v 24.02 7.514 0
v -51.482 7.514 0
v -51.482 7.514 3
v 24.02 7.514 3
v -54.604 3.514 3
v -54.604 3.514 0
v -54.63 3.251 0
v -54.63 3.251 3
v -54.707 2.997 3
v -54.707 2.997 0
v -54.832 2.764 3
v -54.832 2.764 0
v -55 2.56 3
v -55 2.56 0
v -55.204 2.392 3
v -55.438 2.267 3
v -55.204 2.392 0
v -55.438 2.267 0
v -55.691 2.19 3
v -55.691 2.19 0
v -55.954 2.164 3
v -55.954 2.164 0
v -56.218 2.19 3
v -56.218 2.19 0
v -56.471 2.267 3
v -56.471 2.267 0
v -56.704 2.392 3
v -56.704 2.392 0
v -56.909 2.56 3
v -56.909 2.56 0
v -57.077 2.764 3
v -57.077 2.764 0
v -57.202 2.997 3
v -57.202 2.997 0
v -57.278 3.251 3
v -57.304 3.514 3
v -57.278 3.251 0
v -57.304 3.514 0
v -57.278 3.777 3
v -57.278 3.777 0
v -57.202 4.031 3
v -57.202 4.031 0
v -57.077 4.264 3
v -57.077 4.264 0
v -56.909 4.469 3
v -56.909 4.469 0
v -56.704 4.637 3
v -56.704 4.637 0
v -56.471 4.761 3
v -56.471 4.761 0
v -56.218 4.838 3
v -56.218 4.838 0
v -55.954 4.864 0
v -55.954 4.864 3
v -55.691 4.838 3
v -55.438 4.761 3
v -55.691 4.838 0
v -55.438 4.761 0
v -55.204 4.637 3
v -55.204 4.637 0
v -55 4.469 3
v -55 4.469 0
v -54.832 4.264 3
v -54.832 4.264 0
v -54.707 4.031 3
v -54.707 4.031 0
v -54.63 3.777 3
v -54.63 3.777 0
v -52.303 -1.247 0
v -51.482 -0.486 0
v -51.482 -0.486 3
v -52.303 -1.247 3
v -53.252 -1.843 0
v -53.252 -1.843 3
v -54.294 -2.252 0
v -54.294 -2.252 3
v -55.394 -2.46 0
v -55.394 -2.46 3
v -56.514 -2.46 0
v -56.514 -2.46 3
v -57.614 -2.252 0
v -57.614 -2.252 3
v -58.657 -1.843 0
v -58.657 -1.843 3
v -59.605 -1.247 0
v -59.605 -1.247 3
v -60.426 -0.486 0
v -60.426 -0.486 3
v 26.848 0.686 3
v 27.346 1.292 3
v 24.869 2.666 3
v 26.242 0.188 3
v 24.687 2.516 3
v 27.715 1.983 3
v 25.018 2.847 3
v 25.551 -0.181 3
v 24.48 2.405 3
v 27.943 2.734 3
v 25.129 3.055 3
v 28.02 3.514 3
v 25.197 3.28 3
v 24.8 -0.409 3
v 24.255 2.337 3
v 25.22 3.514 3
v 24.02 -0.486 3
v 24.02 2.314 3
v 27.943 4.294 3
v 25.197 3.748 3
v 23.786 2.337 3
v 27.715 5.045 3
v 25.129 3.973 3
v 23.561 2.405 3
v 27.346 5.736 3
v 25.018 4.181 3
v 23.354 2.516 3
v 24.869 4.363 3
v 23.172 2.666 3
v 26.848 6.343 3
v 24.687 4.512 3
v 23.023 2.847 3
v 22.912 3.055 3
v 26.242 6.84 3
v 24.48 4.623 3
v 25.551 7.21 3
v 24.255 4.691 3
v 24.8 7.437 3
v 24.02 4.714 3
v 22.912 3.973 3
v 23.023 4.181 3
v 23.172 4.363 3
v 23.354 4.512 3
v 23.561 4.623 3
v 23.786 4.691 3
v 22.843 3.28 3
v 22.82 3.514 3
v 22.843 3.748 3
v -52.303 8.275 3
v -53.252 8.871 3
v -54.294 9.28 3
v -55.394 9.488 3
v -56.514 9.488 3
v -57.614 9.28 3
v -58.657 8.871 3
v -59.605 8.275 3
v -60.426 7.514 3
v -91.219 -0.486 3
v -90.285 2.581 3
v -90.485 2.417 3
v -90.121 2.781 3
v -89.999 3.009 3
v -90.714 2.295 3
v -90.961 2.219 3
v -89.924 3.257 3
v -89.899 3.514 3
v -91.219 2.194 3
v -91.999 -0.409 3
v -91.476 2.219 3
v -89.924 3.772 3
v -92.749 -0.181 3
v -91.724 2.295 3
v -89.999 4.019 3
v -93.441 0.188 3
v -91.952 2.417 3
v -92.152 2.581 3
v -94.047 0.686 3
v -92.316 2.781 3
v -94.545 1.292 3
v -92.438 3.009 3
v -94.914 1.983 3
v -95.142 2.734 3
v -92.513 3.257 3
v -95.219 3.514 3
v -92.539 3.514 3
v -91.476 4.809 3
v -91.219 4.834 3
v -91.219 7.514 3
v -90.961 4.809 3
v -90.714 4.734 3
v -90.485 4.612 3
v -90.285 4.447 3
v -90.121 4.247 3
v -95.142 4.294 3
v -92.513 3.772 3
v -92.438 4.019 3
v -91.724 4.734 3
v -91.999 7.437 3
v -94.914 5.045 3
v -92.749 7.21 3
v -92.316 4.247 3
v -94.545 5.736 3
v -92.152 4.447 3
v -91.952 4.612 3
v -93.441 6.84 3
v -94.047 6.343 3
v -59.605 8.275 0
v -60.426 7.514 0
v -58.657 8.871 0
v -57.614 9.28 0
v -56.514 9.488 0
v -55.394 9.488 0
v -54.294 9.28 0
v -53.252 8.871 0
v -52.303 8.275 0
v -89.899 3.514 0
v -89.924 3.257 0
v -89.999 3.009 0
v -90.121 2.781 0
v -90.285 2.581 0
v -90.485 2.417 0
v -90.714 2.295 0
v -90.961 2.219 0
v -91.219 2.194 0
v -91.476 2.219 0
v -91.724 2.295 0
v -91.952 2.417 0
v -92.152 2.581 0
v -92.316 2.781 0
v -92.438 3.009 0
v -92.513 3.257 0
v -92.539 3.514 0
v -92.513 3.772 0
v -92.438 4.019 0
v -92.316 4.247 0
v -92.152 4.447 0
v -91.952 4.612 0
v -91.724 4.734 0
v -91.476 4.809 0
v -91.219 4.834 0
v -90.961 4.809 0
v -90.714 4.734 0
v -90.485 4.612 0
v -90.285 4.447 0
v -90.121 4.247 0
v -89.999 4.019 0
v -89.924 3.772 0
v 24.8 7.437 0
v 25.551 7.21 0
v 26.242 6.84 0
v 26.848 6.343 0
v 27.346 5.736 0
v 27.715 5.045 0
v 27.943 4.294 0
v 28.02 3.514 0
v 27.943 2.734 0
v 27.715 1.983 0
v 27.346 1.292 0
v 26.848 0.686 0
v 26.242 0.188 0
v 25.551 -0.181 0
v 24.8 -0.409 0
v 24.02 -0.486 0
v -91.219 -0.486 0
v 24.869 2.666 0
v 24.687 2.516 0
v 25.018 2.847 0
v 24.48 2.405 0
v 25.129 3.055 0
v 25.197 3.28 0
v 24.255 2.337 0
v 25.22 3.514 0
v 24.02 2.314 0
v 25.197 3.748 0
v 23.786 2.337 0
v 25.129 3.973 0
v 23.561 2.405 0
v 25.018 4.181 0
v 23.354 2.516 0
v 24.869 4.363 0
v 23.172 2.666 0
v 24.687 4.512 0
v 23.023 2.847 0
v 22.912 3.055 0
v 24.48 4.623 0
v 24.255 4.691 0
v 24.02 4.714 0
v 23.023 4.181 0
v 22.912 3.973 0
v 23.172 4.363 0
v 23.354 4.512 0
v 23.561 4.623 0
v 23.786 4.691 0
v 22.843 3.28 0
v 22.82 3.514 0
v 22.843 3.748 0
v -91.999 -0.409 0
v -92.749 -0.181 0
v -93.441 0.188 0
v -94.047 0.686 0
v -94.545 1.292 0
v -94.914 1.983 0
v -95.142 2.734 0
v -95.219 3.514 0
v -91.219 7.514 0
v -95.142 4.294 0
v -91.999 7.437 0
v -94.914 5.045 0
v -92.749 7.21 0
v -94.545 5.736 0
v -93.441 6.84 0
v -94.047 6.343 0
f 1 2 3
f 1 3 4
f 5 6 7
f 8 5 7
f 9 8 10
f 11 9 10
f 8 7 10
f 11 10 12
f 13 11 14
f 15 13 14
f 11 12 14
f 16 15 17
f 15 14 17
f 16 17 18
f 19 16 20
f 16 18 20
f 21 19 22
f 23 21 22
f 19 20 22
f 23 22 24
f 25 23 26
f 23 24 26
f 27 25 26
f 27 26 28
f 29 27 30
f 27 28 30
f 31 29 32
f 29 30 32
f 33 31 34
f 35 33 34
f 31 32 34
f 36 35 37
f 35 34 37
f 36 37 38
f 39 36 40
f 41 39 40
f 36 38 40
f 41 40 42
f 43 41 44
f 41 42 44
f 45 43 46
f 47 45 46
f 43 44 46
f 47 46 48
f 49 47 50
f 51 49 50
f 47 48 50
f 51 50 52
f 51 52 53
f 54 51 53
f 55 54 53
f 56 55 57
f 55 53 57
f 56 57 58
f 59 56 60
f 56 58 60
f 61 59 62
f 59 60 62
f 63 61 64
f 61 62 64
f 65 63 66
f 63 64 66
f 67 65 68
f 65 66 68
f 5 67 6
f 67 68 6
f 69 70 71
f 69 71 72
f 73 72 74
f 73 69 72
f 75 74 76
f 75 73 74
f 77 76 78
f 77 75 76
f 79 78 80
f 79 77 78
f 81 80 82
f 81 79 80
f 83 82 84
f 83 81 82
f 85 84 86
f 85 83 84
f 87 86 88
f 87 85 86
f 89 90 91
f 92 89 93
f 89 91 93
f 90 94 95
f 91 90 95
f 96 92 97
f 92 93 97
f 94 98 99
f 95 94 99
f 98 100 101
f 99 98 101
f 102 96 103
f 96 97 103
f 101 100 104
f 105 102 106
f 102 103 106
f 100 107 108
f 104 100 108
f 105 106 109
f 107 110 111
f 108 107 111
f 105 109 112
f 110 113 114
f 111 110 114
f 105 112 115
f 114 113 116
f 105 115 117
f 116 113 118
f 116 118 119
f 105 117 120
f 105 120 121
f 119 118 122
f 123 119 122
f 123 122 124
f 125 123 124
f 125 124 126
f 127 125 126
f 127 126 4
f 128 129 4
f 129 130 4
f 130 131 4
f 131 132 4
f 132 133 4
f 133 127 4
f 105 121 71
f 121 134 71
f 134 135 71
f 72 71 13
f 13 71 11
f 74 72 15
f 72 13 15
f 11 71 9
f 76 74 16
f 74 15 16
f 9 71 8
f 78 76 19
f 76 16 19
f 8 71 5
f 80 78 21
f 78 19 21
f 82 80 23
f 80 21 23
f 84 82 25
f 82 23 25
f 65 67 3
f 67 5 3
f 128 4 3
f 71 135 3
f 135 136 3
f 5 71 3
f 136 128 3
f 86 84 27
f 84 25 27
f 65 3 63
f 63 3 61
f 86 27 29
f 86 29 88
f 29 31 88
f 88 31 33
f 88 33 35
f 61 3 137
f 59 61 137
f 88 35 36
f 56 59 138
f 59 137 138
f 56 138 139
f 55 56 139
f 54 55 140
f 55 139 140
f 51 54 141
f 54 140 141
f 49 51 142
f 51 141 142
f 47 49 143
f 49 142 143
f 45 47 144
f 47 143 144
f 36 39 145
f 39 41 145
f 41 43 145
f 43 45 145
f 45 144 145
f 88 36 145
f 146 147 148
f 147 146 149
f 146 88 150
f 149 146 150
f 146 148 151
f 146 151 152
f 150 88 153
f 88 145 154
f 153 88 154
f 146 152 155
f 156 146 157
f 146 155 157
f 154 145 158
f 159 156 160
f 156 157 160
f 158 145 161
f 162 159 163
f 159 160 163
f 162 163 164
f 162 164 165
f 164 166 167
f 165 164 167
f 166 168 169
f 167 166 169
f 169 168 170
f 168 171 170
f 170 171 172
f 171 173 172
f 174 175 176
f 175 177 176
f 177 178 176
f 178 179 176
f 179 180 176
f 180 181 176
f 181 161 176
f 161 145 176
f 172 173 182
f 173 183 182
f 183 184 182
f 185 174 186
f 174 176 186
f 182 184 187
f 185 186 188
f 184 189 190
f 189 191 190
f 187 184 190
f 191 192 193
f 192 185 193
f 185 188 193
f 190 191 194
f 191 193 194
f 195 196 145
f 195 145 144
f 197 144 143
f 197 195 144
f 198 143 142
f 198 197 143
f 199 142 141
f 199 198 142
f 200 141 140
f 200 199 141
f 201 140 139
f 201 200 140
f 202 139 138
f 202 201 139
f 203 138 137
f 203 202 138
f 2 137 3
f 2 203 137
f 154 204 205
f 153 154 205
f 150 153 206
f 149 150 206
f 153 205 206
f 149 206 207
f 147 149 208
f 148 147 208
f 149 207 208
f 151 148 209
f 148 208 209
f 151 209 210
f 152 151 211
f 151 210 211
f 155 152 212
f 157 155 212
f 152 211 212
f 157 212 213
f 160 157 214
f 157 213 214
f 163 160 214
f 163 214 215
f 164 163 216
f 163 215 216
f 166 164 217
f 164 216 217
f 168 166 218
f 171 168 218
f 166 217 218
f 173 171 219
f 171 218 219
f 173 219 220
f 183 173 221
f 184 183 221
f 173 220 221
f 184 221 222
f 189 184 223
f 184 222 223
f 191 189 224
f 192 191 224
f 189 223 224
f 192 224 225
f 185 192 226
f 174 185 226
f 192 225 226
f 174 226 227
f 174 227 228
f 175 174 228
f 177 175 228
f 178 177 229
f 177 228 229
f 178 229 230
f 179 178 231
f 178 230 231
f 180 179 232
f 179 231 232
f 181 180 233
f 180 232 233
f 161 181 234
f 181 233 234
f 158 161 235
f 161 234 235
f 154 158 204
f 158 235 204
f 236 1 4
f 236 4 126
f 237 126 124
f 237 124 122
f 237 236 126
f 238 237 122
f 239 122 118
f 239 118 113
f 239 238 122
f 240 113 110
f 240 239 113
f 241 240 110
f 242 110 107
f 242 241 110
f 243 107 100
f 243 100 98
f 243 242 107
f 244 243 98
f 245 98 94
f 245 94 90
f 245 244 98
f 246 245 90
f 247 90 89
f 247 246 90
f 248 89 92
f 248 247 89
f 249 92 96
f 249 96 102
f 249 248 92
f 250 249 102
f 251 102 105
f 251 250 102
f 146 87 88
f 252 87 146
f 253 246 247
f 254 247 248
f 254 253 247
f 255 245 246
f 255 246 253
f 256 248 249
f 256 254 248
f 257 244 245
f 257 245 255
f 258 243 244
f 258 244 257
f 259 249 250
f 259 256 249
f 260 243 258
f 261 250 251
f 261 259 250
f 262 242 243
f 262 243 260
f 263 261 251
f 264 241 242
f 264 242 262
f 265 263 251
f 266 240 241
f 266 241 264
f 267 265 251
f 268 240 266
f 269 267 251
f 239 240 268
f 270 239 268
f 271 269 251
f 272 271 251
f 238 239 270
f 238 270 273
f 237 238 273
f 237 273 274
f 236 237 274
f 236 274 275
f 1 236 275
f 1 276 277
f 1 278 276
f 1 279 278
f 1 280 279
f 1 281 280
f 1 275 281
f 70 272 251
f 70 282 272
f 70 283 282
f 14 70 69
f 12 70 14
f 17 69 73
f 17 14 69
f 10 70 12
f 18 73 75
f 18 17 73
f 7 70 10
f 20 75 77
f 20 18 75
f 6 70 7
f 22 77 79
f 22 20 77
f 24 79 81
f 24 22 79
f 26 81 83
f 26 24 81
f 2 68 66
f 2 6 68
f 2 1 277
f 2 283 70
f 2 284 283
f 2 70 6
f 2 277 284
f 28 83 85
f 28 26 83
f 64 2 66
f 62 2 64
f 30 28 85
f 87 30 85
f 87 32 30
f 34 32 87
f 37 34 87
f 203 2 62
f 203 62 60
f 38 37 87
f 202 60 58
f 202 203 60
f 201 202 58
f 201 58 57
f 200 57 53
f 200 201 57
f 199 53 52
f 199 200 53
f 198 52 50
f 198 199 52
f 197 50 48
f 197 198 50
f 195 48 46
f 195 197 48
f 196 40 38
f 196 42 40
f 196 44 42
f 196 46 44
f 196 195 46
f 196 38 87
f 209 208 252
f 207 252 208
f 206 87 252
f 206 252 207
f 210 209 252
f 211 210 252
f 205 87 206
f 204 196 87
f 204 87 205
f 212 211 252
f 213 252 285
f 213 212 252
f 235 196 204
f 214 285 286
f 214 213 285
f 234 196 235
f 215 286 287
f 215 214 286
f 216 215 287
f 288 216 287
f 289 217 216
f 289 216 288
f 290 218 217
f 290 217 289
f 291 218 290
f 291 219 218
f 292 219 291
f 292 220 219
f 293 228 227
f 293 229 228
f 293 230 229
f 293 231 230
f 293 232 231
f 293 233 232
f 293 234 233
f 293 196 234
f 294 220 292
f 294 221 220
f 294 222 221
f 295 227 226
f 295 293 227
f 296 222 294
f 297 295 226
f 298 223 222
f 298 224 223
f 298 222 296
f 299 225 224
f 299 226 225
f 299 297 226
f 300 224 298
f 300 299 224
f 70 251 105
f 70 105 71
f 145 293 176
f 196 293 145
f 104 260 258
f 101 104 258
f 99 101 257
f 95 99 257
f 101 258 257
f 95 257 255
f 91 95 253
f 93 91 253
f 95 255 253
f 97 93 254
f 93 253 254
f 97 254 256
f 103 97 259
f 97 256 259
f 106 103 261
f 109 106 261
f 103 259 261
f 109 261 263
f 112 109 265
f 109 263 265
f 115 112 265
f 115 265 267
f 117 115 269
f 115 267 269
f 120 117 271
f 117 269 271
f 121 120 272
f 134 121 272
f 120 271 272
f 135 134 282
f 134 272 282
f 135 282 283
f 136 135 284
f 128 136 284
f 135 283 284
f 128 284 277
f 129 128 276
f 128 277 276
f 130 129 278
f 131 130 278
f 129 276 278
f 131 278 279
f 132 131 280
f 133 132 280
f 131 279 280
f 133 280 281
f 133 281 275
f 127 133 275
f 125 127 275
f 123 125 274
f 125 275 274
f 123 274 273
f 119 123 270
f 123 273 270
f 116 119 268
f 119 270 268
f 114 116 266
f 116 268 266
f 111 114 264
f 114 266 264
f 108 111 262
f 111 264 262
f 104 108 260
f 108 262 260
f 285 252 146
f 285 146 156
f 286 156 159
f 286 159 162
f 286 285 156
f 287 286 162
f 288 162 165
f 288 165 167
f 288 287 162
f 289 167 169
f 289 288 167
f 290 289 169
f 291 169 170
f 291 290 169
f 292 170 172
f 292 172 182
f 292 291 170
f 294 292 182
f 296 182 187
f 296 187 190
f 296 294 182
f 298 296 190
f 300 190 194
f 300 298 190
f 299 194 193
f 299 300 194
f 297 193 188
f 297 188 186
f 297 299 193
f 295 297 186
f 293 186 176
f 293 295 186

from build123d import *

# Parameters (mm, degrees)
SKETCH_1_R      = 1.2
SKETCH_1_R_2    = 1.35
SKETCH_1_R_3    = 1.32
EXTRUDE_1_DEPTH = 3


with BuildPart() as part:
    # 草图1 → 凸台-拉伸1 (new body)
    with BuildSketch(Plane(origin=(0, 0, 0), x_dir=(-1, 0, 0), z_dir=(0, 0, -1))):
        with BuildLine():
            Line((91.218663814, 7.514094575), (60.426417561, 7.514094575))
            ThreePointArc((60.426417561, 7.514094575), (55.954281606, 9.514094575), (51.482145651, 7.514094575))
            Line((51.482145651, 7.514094575), (-24.019834979, 7.514094575))
            ThreePointArc((-24.019834979, 7.514094575), (-28.019834979, 3.514094575), (-24.019834979, -0.485905425))
            Line((-24.019834979, -0.485905425), (51.482145651, -0.485905425))
            ThreePointArc((51.482145651, -0.485905425), (55.954281606, -2.485905425), (60.426417561, -0.485905425))
            Line((60.426417561, -0.485905425), (91.218663814, -0.485905425))
            ThreePointArc((91.218663814, -0.485905425), (95.218663814, 3.514094575), (91.218663814, 7.514094575))
        make_face()
        with Locations(Location((-24.020396654, 3.514094575, 0), (0, 0, 180))):
            Circle(SKETCH_1_R, mode=Mode.SUBTRACT)
        with Locations(Location((55.954281606, 3.514094575, 0), (0, 0, 180))):
            Circle(SKETCH_1_R_2, mode=Mode.SUBTRACT)
        with Locations(Location((91.218663814, 3.514094575, 0), (0, 0, 180))):
            Circle(SKETCH_1_R_3, mode=Mode.SUBTRACT)
    extrude(amount=-EXTRUDE_1_DEPTH)


solid = part.part
